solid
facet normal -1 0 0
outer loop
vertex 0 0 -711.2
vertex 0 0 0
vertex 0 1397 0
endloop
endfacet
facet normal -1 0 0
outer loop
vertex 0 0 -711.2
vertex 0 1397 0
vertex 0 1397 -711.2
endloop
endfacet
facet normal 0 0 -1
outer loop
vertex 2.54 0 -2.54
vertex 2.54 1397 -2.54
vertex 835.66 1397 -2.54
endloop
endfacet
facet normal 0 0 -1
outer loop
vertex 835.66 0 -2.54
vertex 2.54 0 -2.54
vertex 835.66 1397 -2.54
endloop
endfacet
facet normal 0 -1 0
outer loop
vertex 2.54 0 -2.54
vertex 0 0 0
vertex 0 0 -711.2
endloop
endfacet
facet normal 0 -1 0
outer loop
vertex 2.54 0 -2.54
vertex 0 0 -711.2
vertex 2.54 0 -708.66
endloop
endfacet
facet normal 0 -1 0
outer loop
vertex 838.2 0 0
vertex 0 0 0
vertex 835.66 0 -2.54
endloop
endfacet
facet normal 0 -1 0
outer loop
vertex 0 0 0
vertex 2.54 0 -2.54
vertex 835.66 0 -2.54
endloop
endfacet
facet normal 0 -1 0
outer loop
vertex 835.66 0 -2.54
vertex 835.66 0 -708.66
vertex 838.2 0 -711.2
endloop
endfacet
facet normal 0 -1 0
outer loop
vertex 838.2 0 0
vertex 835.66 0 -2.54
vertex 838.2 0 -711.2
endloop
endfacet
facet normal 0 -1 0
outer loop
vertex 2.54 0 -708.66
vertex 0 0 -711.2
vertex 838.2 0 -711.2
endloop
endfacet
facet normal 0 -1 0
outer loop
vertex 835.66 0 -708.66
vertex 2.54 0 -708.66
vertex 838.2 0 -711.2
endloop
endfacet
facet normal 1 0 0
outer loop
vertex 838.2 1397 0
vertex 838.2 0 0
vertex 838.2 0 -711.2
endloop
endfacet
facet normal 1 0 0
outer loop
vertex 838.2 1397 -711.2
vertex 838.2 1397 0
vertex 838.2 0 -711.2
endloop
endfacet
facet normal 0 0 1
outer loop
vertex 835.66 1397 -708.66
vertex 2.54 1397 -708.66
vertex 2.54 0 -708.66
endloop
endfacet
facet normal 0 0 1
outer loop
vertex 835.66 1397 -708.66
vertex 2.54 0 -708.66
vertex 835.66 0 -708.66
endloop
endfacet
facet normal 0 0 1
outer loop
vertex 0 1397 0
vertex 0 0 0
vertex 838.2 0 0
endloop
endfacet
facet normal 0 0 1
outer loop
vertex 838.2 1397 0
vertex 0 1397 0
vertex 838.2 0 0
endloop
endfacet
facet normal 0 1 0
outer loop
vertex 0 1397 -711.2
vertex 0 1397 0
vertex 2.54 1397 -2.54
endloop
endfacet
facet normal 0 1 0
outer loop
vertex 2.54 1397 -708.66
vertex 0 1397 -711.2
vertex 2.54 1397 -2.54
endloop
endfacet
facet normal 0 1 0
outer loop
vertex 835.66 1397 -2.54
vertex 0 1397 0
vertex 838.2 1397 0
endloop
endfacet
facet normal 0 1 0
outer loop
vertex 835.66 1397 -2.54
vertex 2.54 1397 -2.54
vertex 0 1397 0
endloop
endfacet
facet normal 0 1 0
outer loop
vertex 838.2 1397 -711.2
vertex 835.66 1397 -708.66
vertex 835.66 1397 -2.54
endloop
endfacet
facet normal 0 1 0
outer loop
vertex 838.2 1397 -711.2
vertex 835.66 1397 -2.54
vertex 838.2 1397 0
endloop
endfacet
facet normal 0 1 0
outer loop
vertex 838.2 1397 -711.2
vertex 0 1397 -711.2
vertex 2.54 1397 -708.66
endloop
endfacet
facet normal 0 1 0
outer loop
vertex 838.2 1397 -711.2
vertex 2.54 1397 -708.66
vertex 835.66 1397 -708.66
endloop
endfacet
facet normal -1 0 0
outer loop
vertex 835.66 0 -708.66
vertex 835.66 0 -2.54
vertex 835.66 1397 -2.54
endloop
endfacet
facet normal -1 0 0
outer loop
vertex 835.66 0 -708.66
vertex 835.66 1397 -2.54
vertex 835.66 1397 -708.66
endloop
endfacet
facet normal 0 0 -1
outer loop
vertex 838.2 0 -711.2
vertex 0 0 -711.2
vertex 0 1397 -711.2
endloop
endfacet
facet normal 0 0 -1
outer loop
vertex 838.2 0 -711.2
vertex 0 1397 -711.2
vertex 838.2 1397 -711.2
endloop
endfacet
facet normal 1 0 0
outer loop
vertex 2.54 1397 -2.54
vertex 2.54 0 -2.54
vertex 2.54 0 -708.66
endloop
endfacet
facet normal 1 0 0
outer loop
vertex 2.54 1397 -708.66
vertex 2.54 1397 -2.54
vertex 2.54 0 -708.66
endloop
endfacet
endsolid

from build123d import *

# Parameters (mm, degrees)
SKETCH1_W           = 838.2
SKETCH1_H           = 711.2
BOSS_EXTRUDE1_DEPTH = 1397
SHELL1_T            = -2.54
CUT_EXTRUDE1_REACH  = 4.54
SKETCH2_W           = 833.12
SKETCH2_H           = 706.12


with BuildPart() as part:
    # Sketch1 → Boss-Extrude1 (new body)
    with BuildSketch(Plane(origin=(0, 0, 0), x_dir=(1, 0, 0), z_dir=(0, 1, 0))):
        with Locations((419.1, 355.6)):
            Rectangle(SKETCH1_W, SKETCH1_H)
    extrude(amount=BOSS_EXTRUDE1_DEPTH)

    # Shell1
    shell1_openings = [part.faces().sort_by_distance(p)[0] for p in [
        (419.1, 0, -355.6),
    ]]
    offset(amount=SHELL1_T, openings=shell1_openings, kind=Kind.INTERSECTION)

    # Sketch2 → Cut-Extrude1 (cut, up to next)
    with BuildSketch(Plane.XZ.offset(-1394.46), mode=Mode.PRIVATE) as cut_extrude1_sk1:
        with Locations((419.1, -355.6)):
            Rectangle(SKETCH2_W, SKETCH2_H)
    cut_extrude1_tool1 = extrude(cut_extrude1_sk1.sketch, amount=-CUT_EXTRUDE1_REACH, mode=Mode.PRIVATE) & part.part
    add(cut_extrude1_tool1.solids().sort_by_distance((419.1, 1394.46, -355.6))[0], mode=Mode.SUBTRACT)


solid = part.part
